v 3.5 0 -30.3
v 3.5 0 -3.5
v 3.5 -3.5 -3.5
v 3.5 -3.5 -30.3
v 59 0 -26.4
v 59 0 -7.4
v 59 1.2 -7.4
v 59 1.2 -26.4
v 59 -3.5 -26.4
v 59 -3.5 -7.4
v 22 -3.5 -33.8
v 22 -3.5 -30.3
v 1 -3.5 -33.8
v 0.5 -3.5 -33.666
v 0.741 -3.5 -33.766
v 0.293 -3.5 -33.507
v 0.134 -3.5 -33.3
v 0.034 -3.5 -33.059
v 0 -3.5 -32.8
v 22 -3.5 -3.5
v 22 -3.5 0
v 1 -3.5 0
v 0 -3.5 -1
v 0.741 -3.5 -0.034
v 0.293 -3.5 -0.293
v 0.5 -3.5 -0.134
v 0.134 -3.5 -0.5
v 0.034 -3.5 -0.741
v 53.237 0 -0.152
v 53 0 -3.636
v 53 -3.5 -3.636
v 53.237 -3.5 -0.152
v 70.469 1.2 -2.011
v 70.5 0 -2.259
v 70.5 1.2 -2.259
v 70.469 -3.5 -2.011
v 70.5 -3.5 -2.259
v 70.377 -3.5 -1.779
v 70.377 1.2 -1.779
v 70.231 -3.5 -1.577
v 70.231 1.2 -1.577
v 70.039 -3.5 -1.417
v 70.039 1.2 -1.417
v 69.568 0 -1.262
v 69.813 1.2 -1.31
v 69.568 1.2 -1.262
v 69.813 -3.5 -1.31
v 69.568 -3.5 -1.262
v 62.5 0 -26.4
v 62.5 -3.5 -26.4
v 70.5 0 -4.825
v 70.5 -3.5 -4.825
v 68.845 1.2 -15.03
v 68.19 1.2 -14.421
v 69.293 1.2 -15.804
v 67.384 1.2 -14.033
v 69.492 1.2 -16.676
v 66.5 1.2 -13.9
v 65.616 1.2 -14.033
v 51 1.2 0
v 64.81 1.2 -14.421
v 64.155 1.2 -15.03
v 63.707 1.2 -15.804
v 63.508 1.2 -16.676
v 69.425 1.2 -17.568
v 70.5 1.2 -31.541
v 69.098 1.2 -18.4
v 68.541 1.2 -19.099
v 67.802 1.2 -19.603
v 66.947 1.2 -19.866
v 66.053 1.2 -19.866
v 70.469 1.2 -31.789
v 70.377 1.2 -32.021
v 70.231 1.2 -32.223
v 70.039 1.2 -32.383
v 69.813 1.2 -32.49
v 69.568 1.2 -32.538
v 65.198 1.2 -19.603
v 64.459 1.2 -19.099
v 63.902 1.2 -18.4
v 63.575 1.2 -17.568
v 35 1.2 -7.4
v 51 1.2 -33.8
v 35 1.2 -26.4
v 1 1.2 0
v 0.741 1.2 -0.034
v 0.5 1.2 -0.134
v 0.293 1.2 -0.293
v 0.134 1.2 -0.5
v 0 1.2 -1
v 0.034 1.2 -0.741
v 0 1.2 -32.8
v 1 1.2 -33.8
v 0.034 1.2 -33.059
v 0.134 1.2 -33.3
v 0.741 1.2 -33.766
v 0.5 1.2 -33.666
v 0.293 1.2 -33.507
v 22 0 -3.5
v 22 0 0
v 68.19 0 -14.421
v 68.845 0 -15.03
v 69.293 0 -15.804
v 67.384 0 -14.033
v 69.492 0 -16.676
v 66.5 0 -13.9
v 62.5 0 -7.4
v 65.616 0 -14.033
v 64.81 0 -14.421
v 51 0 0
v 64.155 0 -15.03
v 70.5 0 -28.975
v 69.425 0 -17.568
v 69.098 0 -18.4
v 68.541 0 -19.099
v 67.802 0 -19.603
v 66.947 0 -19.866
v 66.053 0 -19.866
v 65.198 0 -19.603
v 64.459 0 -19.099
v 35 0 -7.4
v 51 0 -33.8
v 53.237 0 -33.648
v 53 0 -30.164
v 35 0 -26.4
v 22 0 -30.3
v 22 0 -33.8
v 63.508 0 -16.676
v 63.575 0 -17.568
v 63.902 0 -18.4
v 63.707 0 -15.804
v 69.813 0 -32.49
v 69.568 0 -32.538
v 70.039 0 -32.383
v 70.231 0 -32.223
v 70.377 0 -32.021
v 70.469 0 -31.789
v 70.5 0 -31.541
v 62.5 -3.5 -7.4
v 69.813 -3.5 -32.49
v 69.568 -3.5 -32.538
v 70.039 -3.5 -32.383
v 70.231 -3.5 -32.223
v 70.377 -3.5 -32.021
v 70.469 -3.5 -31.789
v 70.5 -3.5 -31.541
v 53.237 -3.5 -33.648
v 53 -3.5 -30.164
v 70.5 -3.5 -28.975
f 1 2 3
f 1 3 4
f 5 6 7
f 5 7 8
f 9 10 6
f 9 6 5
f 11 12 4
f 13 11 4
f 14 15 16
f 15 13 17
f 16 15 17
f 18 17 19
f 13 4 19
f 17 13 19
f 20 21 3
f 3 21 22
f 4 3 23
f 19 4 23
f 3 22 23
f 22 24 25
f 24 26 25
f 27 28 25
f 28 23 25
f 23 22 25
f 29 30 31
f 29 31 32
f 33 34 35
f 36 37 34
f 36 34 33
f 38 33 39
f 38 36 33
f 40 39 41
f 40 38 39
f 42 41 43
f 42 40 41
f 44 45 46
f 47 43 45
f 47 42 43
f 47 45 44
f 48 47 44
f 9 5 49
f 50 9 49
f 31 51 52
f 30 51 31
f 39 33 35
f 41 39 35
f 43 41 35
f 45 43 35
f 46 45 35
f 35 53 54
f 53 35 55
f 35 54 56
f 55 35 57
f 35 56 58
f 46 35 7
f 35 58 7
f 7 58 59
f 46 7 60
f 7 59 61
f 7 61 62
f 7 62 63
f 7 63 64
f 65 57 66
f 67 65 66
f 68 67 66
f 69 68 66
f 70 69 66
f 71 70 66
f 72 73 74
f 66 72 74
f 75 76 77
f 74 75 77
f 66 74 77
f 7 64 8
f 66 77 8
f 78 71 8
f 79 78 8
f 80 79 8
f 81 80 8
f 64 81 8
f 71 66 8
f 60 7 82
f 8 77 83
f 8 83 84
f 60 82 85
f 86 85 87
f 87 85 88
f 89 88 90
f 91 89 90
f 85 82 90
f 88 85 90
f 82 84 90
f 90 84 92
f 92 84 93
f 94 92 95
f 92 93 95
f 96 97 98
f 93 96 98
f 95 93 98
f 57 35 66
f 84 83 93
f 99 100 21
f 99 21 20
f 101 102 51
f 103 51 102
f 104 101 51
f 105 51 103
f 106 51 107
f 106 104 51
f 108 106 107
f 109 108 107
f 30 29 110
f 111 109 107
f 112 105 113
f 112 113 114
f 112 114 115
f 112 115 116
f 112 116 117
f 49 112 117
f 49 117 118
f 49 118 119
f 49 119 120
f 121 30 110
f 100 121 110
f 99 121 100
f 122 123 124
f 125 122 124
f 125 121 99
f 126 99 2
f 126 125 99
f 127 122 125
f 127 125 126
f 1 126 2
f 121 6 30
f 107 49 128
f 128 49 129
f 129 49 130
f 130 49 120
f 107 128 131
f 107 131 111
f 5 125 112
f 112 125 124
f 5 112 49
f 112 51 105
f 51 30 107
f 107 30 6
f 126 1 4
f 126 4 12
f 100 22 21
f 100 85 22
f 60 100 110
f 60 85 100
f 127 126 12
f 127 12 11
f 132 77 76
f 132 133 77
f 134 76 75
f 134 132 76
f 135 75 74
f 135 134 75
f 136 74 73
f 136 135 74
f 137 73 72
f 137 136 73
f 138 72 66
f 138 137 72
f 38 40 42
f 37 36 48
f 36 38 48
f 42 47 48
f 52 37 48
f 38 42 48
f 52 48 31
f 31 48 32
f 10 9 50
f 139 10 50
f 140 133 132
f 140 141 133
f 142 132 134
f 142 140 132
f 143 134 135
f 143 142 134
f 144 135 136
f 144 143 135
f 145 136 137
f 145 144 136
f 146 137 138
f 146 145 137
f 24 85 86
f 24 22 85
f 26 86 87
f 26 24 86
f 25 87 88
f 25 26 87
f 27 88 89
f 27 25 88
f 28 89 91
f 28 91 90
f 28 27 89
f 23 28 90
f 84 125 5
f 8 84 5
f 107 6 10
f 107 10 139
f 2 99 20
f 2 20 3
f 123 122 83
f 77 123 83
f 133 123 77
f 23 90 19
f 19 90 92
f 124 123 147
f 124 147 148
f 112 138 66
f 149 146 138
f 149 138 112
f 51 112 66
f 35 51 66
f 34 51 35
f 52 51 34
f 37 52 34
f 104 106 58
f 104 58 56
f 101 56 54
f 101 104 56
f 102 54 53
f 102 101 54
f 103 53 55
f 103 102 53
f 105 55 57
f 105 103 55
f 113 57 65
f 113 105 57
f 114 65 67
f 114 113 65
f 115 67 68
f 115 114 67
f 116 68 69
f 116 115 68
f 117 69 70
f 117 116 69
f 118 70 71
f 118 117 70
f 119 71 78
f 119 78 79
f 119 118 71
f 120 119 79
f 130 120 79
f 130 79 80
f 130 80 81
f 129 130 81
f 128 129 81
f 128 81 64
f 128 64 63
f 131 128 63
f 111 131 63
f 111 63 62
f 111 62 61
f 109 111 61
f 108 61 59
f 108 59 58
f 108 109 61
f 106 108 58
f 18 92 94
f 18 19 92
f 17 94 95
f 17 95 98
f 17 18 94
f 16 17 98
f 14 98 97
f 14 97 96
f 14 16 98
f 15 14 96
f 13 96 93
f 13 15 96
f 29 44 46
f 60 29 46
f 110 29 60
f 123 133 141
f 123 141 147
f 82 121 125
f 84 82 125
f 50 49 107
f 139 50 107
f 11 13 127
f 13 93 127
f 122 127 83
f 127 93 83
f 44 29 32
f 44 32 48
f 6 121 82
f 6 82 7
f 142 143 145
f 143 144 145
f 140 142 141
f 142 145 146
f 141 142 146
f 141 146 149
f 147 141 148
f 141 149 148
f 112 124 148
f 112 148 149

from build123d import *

# Parameters (mm, degrees)
SKETCH1_R           = 3
SKETCH1_W           = 24
SKETCH1_H           = 19
BOSS_EXTRUDE1_DEPTH = 1.2
SKETCH2_W           = 3.5
SKETCH2_H           = 19
BOSS_EXTRUDE2_DEPTH = 3.5
FILLET1_R           = 1


with BuildPart() as part:
    # Sketch1 → Boss-Extrude1 (new body)
    with BuildSketch(Plane(origin=(0, 0, 0), x_dir=(1, 0, 0), z_dir=(0, 1, 0))):
        Polygon((51, 33.8), (70.5, 32.475), (70.5, 1.325), (51, 0), (0, 0), (0, 33.8), align=None)
        with Locations(Location((66.5, 16.9, 0), (0, 0, 270))):
            Circle(SKETCH1_R, mode=Mode.SUBTRACT)
        with Locations((47, 16.9)):
            Rectangle(SKETCH1_W, SKETCH1_H, mode=Mode.SUBTRACT)
    extrude(amount=BOSS_EXTRUDE1_DEPTH)

    # Sketch2 → Boss-Extrude2 (add)
    with BuildSketch(Plane.XZ):
        Polygon((0, 0), (22, 0), (22, -3.5), (3.5, -3.5), (3.5, -30.3), (22, -30.3), (22, -33.8), (4.40507534, -33.8), (0, -33.8), (0, -3.5), align=None)
        Polygon((53.236727535, -0.151982768), (70.5, -1.325), (70.5, -4.825), (53, -3.635897436), align=None)
        Polygon((70.5, -32.475), (53.236727535, -33.648017232), (53, -30.164102564), (70.5, -28.975), align=None)
        with Locations((60.75, -16.9)):
            Rectangle(SKETCH2_W, SKETCH2_H)
    extrude(amount=BOSS_EXTRUDE2_DEPTH)

    # Fillet1
    fillet1_edges = [part.edges().sort_by_distance(p)[0] for p in [
        (0, -1.15, -33.8),
        (70.5, -1.15, -32.475),
        (70.5, -1.15, -1.325),
        (0, -1.15, 0),
    ]]
    fillet(fillet1_edges, radius=FILLET1_R)


solid = part.part
